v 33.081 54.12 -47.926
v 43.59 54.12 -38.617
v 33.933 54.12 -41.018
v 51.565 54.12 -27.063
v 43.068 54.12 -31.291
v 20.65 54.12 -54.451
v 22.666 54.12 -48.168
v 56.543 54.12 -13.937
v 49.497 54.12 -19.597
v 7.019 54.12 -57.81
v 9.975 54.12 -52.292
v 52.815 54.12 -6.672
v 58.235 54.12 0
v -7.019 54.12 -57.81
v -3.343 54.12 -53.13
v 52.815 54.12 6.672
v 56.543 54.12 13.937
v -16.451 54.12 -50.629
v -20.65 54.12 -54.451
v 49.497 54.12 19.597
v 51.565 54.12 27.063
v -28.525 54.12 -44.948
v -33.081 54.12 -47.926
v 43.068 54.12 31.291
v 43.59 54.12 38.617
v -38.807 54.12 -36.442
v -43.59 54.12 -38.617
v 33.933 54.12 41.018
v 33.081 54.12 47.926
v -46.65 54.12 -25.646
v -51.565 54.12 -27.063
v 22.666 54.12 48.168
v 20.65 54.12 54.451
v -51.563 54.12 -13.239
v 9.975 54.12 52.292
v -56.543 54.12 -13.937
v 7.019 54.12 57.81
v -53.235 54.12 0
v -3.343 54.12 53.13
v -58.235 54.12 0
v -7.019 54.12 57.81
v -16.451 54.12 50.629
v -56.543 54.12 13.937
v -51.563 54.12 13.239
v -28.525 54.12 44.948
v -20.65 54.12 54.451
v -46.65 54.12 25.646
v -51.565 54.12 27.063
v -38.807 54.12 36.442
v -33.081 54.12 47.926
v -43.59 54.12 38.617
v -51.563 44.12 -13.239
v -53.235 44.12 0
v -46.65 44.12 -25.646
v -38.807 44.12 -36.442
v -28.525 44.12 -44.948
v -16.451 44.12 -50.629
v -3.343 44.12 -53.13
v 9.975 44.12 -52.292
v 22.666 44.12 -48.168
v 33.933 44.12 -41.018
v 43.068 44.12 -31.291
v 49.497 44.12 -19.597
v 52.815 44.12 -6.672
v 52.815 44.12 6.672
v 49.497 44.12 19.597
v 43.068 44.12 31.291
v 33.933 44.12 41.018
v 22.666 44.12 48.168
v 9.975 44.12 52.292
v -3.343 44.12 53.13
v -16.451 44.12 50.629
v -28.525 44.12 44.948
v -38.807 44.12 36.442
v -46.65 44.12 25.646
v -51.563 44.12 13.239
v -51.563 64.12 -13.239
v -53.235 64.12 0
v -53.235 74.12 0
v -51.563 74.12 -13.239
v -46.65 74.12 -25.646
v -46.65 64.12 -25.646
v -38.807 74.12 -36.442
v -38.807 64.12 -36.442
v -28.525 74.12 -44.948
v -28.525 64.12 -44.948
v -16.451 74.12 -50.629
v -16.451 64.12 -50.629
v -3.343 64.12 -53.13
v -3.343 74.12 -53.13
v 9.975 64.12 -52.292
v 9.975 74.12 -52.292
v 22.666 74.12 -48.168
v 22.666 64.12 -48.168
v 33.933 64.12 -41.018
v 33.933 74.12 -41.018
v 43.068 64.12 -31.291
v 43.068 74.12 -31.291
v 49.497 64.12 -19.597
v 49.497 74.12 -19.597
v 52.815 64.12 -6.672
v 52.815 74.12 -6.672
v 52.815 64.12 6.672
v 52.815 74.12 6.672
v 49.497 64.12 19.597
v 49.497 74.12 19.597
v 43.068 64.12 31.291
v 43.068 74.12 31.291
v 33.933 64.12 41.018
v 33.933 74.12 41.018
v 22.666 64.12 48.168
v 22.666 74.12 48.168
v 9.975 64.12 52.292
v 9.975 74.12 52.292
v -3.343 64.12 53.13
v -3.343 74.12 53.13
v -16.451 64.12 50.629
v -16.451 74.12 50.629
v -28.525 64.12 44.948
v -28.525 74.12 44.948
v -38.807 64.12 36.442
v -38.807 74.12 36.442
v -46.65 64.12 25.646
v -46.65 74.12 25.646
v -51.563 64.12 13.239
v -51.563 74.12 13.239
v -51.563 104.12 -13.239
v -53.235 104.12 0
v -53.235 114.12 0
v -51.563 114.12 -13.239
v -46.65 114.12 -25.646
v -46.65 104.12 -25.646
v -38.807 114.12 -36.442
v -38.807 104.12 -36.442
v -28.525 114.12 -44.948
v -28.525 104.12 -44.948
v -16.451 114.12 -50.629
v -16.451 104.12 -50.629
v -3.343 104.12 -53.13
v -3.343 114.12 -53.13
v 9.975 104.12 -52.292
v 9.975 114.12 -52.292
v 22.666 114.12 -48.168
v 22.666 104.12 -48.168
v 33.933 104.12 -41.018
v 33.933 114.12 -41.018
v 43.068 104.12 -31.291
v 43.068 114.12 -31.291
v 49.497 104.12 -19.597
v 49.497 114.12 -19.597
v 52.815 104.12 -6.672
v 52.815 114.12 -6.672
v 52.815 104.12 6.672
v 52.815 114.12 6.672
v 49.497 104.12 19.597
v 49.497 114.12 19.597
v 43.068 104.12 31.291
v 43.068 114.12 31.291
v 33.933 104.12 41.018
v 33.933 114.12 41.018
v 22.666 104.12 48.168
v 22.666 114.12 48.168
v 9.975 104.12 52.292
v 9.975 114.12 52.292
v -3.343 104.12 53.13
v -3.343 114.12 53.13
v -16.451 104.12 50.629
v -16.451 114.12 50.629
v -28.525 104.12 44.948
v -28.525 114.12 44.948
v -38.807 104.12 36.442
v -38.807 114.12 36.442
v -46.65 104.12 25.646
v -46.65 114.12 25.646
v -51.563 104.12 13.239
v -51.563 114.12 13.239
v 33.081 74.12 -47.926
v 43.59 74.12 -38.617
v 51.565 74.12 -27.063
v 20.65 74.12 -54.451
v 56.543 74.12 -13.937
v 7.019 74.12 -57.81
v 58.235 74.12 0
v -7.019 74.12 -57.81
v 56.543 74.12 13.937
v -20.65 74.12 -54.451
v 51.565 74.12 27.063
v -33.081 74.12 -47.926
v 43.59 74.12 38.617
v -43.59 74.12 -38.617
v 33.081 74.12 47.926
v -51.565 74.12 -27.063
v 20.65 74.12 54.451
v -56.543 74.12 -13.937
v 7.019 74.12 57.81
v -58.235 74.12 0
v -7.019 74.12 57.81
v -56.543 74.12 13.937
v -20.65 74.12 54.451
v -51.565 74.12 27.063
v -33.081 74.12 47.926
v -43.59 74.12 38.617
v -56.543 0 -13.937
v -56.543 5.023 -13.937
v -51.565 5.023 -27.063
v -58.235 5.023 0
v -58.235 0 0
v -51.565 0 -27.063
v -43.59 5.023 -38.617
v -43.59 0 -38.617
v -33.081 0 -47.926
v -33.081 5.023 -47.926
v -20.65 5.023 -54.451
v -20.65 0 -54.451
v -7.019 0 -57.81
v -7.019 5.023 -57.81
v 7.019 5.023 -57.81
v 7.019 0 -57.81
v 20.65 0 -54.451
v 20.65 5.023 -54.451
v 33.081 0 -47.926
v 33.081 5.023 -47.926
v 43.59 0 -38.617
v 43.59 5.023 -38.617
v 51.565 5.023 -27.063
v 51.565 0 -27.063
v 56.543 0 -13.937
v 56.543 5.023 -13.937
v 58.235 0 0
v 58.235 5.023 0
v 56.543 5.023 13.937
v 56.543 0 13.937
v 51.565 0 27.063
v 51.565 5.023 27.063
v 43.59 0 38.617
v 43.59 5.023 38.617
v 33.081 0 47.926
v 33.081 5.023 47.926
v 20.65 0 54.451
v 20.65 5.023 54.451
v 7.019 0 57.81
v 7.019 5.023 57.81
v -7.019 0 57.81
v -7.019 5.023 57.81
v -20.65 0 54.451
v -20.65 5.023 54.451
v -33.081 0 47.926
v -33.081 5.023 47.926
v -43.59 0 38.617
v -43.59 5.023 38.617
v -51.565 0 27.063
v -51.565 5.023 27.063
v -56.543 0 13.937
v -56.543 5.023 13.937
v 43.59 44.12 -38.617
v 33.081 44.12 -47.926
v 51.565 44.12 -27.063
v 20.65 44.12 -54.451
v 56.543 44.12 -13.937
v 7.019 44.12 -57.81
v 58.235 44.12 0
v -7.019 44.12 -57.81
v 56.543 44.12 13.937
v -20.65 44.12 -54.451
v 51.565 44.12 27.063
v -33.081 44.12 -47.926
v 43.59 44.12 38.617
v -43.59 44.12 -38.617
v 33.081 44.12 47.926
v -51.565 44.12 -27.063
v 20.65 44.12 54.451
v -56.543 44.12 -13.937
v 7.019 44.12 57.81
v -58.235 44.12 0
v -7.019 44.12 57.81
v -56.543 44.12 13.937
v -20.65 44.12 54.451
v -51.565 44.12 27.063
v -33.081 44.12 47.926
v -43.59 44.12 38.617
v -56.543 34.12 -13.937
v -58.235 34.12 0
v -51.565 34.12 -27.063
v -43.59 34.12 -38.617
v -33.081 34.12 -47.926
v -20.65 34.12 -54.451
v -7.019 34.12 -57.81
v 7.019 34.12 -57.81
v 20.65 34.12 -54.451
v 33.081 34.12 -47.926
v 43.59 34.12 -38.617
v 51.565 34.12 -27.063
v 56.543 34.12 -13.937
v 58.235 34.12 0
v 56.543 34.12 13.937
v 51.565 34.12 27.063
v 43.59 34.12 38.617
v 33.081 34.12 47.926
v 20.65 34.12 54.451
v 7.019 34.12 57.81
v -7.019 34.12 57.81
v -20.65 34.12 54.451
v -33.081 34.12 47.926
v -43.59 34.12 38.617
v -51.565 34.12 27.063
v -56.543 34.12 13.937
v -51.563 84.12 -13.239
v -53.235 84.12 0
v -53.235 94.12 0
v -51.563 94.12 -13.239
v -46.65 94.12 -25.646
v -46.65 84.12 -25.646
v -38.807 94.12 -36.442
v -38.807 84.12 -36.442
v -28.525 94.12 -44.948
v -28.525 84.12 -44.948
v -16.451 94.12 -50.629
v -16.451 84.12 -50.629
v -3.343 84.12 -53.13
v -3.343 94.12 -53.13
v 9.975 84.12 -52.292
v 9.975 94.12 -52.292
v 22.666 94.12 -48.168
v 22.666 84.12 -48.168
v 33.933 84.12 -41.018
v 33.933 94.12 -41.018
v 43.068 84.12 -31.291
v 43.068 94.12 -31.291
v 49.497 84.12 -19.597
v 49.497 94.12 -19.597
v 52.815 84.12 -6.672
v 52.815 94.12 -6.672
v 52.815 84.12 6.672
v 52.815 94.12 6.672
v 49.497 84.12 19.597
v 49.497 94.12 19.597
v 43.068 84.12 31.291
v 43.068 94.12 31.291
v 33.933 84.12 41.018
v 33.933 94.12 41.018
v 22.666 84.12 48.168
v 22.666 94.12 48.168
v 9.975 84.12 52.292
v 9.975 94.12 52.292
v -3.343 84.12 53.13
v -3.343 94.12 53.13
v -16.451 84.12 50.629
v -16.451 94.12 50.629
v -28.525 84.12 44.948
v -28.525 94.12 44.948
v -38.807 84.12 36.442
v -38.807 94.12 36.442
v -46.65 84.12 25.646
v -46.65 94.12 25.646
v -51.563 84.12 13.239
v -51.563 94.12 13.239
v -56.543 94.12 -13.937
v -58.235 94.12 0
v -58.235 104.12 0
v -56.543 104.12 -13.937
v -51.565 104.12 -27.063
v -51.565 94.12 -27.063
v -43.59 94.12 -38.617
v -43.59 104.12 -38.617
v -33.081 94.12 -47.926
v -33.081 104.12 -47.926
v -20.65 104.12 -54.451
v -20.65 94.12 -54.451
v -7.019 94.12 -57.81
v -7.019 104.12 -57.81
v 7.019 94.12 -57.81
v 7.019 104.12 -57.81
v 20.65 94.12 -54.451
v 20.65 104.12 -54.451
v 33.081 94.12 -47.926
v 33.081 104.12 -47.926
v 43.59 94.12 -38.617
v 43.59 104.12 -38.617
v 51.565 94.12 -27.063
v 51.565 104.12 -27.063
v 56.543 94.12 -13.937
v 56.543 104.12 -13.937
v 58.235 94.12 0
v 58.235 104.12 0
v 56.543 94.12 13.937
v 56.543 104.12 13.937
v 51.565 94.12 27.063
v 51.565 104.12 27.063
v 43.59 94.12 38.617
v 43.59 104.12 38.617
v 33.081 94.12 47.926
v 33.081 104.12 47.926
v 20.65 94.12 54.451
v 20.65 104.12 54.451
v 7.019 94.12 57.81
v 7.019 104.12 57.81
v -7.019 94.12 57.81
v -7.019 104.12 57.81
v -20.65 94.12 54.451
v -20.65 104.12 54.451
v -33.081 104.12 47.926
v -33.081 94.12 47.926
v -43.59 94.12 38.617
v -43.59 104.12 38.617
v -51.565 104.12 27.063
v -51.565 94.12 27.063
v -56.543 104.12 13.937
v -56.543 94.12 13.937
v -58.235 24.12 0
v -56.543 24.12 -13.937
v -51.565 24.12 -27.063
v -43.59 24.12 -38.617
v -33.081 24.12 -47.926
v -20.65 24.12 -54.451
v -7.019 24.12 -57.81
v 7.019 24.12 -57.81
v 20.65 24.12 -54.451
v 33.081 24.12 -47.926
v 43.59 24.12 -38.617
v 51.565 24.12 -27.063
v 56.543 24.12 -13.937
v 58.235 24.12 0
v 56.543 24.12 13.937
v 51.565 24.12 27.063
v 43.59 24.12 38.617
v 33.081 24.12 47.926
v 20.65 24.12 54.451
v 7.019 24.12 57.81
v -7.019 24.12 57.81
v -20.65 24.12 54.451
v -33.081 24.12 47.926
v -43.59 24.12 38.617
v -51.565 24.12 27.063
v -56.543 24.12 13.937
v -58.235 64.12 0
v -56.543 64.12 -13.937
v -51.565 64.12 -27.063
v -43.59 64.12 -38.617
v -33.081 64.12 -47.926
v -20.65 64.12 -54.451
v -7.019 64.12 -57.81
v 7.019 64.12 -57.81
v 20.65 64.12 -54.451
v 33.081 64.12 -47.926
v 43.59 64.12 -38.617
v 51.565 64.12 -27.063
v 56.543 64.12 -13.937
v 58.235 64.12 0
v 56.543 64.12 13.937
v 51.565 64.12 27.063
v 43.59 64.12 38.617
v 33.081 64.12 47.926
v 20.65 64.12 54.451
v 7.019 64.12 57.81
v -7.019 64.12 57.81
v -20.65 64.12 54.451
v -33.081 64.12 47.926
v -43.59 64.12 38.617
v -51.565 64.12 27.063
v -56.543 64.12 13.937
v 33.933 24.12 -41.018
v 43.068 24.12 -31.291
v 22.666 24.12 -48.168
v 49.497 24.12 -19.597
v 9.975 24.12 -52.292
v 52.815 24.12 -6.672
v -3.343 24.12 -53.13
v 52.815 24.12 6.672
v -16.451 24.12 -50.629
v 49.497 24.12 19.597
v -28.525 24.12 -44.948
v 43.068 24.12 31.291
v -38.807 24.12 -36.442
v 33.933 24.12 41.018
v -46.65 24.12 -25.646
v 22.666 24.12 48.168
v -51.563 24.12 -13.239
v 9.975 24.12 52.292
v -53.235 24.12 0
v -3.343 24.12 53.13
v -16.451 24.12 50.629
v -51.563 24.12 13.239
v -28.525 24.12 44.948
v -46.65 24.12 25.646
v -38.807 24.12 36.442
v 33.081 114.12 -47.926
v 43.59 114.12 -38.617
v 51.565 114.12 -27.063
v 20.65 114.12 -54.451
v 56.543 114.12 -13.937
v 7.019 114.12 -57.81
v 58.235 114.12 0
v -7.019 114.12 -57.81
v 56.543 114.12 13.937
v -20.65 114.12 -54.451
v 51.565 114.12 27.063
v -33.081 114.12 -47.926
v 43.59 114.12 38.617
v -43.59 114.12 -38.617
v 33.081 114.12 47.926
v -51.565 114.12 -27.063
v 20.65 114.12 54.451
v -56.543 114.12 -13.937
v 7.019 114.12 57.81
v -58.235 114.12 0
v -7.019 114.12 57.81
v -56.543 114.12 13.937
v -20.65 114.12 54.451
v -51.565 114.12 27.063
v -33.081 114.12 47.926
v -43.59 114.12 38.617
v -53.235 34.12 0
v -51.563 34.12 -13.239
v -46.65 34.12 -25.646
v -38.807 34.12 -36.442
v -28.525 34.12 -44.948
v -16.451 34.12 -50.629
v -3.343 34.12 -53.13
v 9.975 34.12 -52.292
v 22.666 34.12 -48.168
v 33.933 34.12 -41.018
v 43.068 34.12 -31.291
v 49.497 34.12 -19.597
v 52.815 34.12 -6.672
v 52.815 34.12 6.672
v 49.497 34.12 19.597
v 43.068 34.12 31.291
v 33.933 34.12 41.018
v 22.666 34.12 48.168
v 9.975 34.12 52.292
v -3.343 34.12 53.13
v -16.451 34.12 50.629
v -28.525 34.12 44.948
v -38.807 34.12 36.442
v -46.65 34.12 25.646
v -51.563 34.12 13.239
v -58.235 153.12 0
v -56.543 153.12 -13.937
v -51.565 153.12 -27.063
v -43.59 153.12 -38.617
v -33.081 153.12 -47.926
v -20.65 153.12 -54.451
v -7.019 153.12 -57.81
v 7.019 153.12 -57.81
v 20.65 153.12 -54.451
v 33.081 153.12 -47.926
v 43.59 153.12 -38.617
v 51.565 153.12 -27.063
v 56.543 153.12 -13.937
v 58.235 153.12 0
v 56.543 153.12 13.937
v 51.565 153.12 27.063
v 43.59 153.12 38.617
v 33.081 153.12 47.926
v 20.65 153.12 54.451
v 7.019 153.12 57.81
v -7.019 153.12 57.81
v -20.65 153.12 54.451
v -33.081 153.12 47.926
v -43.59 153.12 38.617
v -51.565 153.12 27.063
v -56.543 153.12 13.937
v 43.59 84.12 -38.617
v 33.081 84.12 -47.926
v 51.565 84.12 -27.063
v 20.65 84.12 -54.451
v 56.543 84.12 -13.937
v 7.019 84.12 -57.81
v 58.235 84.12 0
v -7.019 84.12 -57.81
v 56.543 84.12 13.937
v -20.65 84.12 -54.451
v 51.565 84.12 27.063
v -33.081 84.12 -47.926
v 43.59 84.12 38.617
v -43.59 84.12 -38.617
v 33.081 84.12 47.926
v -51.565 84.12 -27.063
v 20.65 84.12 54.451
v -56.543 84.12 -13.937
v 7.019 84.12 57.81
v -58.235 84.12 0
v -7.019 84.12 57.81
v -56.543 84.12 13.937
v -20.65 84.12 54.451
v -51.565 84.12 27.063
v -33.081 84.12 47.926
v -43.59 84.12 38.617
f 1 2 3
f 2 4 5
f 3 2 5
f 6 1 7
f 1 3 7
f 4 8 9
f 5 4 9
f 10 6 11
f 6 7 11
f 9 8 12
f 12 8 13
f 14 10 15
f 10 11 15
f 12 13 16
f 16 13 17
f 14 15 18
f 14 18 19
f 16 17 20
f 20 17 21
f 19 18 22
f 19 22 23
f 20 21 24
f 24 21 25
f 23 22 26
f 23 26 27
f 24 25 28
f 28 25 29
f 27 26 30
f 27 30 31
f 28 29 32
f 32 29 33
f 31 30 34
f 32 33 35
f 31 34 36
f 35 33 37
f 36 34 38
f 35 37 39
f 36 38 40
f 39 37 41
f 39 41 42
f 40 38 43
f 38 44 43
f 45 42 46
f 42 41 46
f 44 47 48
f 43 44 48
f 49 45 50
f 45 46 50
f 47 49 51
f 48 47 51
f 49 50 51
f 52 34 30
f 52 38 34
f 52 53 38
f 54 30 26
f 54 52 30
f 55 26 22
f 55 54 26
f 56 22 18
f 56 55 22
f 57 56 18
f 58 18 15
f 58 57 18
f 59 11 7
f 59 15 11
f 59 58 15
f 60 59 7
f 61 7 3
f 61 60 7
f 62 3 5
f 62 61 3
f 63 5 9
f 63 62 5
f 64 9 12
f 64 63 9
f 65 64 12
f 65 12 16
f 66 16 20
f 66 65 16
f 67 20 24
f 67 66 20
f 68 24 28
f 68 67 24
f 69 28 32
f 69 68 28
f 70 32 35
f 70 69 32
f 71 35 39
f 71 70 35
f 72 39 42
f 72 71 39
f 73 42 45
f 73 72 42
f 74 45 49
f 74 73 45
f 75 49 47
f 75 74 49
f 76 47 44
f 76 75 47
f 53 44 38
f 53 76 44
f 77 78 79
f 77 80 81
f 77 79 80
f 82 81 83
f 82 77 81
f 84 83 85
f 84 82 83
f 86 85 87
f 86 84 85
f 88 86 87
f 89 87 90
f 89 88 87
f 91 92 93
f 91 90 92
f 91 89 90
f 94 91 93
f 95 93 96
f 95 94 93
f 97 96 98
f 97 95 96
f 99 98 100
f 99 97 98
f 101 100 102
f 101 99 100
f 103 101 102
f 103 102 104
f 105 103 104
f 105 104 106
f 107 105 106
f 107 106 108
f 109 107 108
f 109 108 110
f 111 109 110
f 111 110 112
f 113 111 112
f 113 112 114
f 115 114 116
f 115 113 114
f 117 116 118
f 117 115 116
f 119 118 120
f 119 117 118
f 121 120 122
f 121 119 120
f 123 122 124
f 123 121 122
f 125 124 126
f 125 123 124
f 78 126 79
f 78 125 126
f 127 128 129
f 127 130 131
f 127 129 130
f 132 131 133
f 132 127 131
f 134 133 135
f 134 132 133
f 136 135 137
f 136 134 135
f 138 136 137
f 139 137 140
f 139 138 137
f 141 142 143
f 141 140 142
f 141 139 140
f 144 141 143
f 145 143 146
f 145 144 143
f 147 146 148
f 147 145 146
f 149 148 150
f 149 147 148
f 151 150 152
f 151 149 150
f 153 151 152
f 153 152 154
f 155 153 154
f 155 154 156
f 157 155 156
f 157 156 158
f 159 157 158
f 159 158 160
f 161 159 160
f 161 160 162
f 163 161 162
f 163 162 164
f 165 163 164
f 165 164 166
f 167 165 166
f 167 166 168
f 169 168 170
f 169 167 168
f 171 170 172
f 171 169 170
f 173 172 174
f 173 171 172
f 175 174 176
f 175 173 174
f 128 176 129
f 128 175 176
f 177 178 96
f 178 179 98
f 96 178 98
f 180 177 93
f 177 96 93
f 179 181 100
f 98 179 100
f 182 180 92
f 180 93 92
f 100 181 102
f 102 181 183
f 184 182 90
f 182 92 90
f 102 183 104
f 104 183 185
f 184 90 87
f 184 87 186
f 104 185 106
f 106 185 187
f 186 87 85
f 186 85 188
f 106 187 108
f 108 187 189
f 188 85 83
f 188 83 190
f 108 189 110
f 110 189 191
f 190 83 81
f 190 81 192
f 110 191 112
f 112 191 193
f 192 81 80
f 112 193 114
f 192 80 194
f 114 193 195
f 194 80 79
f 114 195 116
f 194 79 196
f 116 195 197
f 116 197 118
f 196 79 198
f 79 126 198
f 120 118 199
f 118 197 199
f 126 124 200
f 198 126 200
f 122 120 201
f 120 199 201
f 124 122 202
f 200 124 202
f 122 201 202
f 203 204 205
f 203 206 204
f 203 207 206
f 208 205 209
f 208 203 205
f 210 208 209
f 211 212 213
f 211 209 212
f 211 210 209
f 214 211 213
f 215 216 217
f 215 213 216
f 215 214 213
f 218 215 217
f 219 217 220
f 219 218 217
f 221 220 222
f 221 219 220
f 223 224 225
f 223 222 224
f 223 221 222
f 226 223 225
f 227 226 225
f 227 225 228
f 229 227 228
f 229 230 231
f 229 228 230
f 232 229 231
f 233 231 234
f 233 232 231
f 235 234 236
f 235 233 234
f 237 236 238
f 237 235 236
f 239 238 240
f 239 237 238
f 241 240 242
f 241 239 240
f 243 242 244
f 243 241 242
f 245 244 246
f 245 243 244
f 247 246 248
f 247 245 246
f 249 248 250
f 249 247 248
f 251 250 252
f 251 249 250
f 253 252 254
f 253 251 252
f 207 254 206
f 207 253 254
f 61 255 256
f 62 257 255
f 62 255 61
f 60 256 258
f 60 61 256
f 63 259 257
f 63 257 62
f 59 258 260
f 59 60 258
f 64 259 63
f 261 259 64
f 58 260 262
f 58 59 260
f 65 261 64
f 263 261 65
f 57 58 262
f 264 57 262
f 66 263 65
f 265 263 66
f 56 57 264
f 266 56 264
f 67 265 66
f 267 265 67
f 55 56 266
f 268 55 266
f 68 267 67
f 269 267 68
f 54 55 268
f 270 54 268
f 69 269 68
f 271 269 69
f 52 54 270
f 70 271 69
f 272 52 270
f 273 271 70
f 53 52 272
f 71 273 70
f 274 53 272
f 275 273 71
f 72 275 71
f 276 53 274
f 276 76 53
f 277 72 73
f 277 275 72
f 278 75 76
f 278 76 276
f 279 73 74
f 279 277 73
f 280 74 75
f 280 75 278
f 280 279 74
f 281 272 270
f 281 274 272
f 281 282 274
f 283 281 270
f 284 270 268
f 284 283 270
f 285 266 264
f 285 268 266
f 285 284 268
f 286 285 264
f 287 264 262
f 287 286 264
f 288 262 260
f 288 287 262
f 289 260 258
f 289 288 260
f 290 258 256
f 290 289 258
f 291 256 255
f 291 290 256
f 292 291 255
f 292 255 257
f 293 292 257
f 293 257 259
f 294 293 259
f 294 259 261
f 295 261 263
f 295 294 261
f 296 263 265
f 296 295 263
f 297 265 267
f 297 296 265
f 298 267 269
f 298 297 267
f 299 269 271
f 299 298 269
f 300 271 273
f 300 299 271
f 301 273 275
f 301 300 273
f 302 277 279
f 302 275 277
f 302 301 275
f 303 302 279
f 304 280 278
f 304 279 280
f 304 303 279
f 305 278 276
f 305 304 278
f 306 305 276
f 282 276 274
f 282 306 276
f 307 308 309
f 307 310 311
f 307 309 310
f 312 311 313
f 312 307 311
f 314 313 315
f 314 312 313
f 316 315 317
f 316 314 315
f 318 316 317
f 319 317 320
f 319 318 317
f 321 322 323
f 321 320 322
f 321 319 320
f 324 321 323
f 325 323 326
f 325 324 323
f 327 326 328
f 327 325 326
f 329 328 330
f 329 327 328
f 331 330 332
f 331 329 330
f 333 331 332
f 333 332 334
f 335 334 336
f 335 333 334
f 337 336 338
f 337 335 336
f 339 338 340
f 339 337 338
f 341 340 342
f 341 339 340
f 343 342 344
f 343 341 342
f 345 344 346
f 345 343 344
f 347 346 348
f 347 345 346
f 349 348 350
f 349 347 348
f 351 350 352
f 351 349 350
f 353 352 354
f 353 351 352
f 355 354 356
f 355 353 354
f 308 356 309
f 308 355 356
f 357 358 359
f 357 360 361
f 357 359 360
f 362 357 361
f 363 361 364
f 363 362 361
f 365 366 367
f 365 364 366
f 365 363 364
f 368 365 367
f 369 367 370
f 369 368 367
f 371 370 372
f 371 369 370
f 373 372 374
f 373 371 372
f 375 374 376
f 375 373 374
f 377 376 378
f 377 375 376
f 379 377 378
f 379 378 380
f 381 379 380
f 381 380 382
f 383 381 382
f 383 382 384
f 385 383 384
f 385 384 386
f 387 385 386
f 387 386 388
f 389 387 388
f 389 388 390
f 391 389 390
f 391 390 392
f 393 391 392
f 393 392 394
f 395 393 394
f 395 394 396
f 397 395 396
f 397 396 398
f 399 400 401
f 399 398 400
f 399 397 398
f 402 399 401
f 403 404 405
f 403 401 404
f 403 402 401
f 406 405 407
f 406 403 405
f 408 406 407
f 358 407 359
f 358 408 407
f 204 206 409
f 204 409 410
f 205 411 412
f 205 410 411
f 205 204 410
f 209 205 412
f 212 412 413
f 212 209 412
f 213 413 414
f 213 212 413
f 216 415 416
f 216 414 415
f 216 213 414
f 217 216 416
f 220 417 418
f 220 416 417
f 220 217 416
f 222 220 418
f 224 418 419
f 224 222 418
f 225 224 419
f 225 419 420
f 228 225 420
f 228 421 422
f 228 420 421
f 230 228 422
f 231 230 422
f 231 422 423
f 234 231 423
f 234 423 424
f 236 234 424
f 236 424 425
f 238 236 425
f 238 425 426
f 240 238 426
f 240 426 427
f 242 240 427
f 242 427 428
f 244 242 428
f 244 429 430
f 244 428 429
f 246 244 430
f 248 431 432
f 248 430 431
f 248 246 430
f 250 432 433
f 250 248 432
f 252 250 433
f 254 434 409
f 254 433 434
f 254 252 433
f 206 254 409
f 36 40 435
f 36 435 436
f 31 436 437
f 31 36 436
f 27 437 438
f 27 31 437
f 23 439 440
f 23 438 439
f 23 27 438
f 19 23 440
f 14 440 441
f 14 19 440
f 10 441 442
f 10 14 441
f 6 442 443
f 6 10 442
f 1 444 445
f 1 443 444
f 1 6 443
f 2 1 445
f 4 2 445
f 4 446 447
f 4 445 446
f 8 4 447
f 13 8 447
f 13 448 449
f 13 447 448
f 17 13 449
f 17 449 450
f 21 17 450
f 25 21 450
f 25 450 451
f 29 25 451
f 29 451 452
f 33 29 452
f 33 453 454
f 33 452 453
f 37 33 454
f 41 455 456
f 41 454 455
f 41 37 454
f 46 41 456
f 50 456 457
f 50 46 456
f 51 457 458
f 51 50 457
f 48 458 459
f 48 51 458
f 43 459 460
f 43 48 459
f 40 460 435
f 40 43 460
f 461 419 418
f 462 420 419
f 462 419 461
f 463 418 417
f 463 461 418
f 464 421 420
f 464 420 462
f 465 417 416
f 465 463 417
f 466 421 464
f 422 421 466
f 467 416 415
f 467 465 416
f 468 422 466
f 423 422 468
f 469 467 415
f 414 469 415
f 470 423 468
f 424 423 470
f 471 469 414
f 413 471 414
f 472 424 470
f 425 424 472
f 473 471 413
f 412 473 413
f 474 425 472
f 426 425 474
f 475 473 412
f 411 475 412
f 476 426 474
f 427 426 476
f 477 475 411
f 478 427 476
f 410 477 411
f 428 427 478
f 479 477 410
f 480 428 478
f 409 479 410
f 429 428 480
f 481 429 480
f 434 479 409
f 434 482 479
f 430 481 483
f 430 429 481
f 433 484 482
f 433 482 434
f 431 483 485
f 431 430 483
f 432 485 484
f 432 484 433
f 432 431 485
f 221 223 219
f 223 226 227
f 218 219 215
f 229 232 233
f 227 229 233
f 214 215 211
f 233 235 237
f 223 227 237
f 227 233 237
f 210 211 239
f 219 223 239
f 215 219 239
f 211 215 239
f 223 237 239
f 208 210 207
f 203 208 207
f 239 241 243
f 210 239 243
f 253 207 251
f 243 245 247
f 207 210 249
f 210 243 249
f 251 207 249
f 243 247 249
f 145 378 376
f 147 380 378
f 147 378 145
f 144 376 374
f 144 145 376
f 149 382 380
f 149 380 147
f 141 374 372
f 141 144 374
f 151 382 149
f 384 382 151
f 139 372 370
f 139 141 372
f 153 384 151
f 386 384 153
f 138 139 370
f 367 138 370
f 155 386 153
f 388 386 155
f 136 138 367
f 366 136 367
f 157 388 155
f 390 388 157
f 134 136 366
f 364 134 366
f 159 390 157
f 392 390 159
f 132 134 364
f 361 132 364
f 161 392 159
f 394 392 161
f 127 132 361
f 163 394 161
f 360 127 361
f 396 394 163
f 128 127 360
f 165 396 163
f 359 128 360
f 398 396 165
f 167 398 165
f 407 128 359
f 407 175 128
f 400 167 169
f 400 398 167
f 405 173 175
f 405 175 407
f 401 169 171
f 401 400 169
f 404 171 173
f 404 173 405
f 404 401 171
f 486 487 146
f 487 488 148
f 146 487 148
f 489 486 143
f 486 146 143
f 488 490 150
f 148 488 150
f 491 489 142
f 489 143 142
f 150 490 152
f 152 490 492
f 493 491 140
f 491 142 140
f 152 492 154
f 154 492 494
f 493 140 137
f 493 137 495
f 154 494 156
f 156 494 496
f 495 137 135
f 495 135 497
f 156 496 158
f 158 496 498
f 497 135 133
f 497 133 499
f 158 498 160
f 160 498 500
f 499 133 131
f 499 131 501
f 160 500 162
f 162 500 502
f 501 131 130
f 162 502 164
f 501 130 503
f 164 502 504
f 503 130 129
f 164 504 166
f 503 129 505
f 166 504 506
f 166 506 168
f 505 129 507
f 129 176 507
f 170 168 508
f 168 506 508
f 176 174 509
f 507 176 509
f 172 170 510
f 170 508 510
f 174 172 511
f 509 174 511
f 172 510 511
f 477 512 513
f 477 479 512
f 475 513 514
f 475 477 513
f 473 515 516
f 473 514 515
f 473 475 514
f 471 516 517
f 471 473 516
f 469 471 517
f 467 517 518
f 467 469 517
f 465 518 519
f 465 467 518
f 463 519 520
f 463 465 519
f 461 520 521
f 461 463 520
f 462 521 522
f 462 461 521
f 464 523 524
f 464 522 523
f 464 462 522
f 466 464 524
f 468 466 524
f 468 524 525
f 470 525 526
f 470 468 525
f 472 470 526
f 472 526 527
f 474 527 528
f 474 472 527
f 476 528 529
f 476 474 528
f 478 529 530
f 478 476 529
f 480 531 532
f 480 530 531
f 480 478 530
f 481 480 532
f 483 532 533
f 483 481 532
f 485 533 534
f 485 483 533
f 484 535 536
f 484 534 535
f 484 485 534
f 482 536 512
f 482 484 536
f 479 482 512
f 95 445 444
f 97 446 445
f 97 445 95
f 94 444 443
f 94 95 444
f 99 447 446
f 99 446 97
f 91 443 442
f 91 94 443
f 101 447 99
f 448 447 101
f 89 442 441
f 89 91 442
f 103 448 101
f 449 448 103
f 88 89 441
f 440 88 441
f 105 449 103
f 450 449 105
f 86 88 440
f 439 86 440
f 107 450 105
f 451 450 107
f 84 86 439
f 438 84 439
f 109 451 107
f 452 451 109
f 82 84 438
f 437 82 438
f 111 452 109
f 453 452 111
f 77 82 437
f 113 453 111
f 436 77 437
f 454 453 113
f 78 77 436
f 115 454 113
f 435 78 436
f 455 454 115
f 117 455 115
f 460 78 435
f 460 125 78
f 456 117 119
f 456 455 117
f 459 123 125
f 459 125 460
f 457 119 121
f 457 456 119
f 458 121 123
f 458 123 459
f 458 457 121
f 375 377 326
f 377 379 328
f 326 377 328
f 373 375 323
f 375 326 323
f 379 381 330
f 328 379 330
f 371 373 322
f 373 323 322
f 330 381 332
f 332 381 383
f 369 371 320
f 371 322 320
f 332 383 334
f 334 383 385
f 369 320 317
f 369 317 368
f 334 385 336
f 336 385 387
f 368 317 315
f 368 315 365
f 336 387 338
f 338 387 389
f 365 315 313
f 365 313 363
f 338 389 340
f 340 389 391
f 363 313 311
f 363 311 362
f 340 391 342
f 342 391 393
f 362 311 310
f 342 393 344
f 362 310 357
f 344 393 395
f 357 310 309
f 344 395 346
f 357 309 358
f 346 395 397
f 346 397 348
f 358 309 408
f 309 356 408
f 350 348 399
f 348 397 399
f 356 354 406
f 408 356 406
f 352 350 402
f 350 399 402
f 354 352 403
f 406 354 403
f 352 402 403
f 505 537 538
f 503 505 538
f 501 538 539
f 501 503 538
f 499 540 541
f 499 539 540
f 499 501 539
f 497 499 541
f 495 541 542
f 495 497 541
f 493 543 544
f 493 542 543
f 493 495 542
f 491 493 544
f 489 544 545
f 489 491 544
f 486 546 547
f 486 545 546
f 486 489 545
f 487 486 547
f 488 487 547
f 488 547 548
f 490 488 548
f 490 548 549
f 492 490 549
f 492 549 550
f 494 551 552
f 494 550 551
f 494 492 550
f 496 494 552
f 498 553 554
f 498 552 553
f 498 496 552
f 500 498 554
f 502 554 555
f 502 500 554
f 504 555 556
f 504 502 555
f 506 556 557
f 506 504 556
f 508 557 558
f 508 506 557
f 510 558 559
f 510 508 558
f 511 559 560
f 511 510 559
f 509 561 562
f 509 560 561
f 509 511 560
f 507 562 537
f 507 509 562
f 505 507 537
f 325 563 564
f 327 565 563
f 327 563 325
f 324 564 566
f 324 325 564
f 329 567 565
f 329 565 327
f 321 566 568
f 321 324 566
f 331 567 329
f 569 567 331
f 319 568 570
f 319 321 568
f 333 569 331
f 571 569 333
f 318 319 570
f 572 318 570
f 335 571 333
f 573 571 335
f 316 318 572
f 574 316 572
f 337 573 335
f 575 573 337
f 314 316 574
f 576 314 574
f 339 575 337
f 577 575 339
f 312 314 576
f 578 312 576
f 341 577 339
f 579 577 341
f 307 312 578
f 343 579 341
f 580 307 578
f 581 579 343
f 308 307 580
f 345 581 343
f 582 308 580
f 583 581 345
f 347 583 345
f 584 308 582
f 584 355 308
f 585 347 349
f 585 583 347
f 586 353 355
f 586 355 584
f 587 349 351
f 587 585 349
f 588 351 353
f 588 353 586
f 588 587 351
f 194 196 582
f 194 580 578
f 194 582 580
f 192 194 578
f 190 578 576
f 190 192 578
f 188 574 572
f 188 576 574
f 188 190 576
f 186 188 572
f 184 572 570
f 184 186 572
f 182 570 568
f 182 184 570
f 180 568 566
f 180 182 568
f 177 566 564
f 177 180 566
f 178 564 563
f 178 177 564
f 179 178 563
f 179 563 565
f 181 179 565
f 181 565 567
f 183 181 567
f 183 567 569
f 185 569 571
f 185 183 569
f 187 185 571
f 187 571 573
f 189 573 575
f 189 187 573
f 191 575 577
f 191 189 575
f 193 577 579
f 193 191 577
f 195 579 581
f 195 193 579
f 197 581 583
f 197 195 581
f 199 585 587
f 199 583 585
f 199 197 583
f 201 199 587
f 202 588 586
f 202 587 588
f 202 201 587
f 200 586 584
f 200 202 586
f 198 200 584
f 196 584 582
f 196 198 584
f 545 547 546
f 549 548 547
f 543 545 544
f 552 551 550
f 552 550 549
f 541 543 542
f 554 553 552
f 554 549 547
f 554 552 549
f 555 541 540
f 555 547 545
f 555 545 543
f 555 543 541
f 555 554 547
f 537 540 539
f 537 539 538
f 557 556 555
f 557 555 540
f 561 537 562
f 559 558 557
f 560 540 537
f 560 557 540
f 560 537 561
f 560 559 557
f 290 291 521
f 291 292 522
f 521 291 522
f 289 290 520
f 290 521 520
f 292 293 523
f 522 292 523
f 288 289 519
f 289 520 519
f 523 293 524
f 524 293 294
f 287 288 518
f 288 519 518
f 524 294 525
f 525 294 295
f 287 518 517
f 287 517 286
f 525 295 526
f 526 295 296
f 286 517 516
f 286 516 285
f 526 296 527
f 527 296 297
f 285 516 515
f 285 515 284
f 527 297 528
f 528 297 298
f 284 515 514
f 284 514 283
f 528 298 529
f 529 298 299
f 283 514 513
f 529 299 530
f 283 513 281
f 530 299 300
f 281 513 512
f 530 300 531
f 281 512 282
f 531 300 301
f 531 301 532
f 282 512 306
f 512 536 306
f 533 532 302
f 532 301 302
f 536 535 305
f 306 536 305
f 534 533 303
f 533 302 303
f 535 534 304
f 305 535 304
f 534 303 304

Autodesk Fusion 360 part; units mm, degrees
sketch "Sketch1" plane through (0, 0, 0) normal (0, 0, 1) x (1, 0, 0)
sketch "Sketch2" plane through (0, 0, 0) normal (0, 0, 1) x (1, 0, 0)
sketch "Sketch3" plane through (0, 0, 0) normal (0, 0, 1) x (1, 0, 0)
  line L0 (0, 0) -> (0, 153.12)
  line L1 (-58.235, 153.12) -> (-58.235, 114.12)
  line L2 (-58.235, 114.12) -> (-53.235, 114.12)
  line L3 (-53.235, 114.12) -> (-53.235, 104.12)
  line L4 (-53.235, 104.12) -> (-58.235, 104.12)
  line L5 (-58.235, 104.12) -> (-58.235, 94.12)
  line L6 (-58.235, 94.12) -> (-53.235, 94.12)
  line L7 (-53.235, 94.12) -> (-53.235, 84.12)
  line L8 (-53.235, 84.12) -> (-58.235, 84.12)
  line L9 (-58.235, 84.12) -> (-58.235, 74.12)
  line L10 (-58.235, 74.12) -> (-53.235, 74.12)
  line L11 (-53.235, 74.12) -> (-53.235, 64.12)
  line L12 (-53.235, 64.12) -> (-58.235, 64.12)
  line L13 (-58.235, 64.12) -> (-58.235, 54.12)
  line L14 (-58.235, 54.12) -> (-53.235, 54.12)
  line L15 (-53.235, 54.12) -> (-53.235, 44.12)
  line L16 (-53.235, 44.12) -> (-58.235, 44.12)
  line L17 (-58.235, 44.12) -> (-58.235, 34.12)
  line L18 (-58.235, 34.12) -> (-53.235, 34.12)
  line L19 (-53.235, 34.12) -> (-53.235, 24.12)
  line L20 (-53.235, 24.12) -> (-58.235, 24.12)
  line L21 (-58.235, 24.12) -> (-58.235, 5.0228)
  line L22 (-58.235, 5.0228) -> (-58.235, 0)
  line L23 (-58.235, 153.12) -> (0, 153.12)
  line L24 (-58.235, 0) -> (0, 0)
  dimension "d4" = 153.12
  dimension "d5" = 58.235
  dimension "d6" = 39
  dimension "d7" = 5
  dimension "d8" = 10
  dimension "d9" = 5
  dimension "d10" = 10
  dimension "d11" = 5
  dimension "d12" = 10
  dimension "d13" = 5
  dimension "d14" = 10
  dimension "d15" = 5
  dimension "d16" = 10
  dimension "d17" = 5
  dimension "d18" = 10
  dimension "d19" = 5
  dimension "d20" = 10
  dimension "d21" = 5
  dimension "d22" = 10
  dimension "d23" = 5
  dimension "d24" = 10
  dimension "d25" = 5
revolve "Revolve1" add sketch "Sketch3" angle 360 about axis through (0, 0, 0) along (0, 1, 0)
